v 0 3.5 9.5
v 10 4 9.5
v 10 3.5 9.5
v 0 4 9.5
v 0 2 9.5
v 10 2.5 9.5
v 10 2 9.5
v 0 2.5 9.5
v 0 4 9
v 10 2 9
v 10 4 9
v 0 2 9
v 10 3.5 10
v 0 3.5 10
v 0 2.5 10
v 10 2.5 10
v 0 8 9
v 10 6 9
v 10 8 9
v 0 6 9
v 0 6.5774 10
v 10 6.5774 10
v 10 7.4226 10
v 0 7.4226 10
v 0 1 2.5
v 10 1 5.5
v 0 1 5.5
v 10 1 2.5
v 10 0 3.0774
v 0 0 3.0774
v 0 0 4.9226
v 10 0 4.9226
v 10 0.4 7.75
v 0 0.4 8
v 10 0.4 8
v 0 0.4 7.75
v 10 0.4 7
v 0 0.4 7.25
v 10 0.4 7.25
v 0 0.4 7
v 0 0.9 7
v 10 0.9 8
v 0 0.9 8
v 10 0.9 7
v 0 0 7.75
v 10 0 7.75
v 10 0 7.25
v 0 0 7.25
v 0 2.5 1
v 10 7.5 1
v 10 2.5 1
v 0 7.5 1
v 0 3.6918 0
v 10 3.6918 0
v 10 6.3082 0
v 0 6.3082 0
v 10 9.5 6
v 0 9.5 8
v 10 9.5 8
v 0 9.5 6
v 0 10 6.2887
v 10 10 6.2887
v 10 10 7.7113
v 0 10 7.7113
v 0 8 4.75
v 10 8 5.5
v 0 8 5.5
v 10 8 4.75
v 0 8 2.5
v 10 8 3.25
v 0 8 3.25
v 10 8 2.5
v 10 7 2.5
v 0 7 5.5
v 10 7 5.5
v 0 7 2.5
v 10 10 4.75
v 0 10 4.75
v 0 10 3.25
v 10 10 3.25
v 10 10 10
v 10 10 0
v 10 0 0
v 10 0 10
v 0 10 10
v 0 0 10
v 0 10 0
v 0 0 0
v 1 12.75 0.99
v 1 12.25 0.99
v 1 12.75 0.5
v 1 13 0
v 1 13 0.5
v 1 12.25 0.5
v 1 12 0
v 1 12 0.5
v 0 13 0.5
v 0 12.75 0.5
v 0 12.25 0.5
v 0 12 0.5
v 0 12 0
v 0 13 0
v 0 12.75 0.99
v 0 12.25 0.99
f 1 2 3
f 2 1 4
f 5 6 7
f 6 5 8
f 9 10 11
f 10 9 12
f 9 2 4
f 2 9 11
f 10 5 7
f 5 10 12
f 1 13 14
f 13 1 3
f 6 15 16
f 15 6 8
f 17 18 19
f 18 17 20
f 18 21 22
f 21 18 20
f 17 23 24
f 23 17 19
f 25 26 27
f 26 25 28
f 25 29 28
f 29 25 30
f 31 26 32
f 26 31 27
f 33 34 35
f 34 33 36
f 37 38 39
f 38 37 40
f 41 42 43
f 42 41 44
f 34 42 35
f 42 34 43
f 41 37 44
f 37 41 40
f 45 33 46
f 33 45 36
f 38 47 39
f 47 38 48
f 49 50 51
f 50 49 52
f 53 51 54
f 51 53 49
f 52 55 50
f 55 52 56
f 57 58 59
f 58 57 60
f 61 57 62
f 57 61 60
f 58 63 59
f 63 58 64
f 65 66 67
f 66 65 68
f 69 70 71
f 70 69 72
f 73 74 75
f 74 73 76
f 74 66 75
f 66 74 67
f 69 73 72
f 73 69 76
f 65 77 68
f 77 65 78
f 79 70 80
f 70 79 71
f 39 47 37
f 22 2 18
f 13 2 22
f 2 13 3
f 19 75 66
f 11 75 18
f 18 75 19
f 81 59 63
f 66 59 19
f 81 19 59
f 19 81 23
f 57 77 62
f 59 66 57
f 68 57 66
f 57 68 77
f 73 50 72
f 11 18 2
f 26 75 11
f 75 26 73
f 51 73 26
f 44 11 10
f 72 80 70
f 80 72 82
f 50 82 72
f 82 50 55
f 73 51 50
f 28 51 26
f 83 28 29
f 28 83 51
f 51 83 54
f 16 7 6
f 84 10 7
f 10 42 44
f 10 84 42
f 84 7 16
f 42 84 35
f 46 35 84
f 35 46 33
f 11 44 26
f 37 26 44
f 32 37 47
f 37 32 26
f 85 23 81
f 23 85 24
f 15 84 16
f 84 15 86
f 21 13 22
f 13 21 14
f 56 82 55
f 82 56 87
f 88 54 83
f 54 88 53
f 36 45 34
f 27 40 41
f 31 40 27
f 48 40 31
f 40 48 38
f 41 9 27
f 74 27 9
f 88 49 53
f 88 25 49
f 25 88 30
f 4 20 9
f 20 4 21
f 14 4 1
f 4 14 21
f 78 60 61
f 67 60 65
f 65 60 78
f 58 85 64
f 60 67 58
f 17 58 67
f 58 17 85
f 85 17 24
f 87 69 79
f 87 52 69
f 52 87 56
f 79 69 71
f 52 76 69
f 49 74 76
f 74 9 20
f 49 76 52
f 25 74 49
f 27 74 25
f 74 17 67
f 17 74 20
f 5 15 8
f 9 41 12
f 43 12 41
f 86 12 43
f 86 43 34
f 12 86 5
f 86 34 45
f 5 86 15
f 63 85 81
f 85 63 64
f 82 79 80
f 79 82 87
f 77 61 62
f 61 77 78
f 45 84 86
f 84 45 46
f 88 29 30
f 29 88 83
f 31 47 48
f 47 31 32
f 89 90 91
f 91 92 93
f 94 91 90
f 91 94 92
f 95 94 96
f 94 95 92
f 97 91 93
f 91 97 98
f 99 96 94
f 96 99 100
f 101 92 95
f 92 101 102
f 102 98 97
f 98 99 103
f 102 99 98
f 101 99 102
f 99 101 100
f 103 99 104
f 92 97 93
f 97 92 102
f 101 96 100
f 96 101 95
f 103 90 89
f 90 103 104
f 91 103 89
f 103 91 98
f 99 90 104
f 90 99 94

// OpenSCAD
//dovetail, defaults to x-plane.
module dovetail(width, depth, angle, len){
	difference(){
	cube([len,width,depth]);

	rotate(angle, [1,0,0])
	cube([len,depth+1,depth]);
	
	translate([0,width,0])
	mirror([0,1,0])
	rotate(angle, [1,0,0])
		cube([len,depth+1,depth]);		
 	}
}

// t-slot with throat width, throat depth,
// headspace width, headspace depth, and
// overall length.
// default orientation in the x-plane.
module tslot(throat_w, throat_d, hs_w, hs_d, len){
	
	//the heaspace area
	cube([len, hs_w, hs_d]);

	//the bolt channel. 
	translate([0,(-throat_w/2)-(-hs_w/2),hs_d-0.01])
	cube([len, throat_w, throat_d]);
	
}

//creates a single-starting thread. the length of the thread is 
//pitch*num_turns.
module thread( dia   = 0.5,
			 p = 12,
			 angle = 60, 
			 tl    = 10){
}

translate([0,20,0]){
	thread(0.5,12,60,10);
}
//example
//creates a block with slots. 

difference(){
color("blue")
cube([10,10,10]);

translate([-1,2,9])
tslot(1,1,2,0.5,12);

translate([-1,6,9])
dovetail(2,5,60,12);

rotate(90,[1,0,0])
translate([-1,2.5,-1])
dovetail(3,2,60,12);

rotate(90,[1,0,0])
translate([-1,7,-0.9])
tslot(0.5,0.5,1,0.5,12);

rotate(90,[1,0,0])
mirror([0,1,1,])
translate([-1,2.5,-1])
dovetail(5,2,40,12);

rotate(180,[1,0,0])
mirror([0,1,1])
translate([-1,6,9.5])
dovetail(2,1,60,12);

rotate(180,[1,0,0])
mirror([0,1,1])
translate([-1,2.5,7])
tslot(1.5,3,3,1,12);
}

//you can also make a t-nut by threading a hole through a un-subtracted t-slot.
translate([0,12,0])
tslot(0.5,0.5,1,0.5,1);
